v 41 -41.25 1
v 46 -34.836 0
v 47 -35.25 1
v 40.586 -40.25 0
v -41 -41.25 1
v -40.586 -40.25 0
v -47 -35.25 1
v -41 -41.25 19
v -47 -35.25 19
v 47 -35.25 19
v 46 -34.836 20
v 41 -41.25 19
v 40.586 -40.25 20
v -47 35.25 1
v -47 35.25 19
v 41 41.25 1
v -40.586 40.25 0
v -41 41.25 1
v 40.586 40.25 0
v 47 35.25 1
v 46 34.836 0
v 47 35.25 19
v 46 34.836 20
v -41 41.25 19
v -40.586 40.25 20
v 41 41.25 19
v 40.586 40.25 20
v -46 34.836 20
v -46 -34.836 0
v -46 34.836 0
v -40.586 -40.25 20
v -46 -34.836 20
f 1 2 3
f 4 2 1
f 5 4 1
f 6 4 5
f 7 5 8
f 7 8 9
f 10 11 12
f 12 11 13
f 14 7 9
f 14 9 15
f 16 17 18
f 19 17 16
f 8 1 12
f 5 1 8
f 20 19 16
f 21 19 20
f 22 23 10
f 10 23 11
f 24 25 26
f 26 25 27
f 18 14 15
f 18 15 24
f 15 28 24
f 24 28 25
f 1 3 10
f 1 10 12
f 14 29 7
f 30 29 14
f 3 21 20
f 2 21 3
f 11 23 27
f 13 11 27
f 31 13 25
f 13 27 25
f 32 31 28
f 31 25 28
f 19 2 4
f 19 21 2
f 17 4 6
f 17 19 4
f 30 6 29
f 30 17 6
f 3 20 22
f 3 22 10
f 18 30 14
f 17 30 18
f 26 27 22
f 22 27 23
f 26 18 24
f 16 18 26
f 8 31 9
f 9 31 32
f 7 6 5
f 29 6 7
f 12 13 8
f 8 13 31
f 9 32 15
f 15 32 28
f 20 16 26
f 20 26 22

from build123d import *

# Parameters (mm, degrees)
BOSS_EXTRUDE1_DEPTH = 20
CHAMFER1_SIZE       = 1


with BuildPart() as part:
    # Sketch1 → Boss-Extrude1 (new body)
    with BuildSketch(Plane.XY):
        Polygon((-47, 35.25), (-41, 41.25), (41, 41.25), (47, 35.25), (47, -35.25), (41, -41.25), (-41, -41.25), (-47, -35.25), align=None)
    extrude(amount=BOSS_EXTRUDE1_DEPTH)

    # Chamfer1
    chamfer1_edges = [part.edges().sort_by_distance(p)[0] for p in [
        (44, -38.25, 0),
        (0, -41.25, 0),
        (-44, -38.25, 0),
        (-47, 0, 0),
        (0, -41.25, 20),
        (44, -38.25, 20),
        (47, 0, 20),
        (44, 38.25, 20),
        (0, 41.25, 20),
        (-44, 38.25, 20),
        (-47, 0, 20),
        (-44, 38.25, 0),
        (-44, -38.25, 20),
        (0, 41.25, 0),
        (44, 38.25, 0),
        (47, 0, 0),
    ]]
    chamfer(chamfer1_edges, length=CHAMFER1_SIZE)


solid = part.part
